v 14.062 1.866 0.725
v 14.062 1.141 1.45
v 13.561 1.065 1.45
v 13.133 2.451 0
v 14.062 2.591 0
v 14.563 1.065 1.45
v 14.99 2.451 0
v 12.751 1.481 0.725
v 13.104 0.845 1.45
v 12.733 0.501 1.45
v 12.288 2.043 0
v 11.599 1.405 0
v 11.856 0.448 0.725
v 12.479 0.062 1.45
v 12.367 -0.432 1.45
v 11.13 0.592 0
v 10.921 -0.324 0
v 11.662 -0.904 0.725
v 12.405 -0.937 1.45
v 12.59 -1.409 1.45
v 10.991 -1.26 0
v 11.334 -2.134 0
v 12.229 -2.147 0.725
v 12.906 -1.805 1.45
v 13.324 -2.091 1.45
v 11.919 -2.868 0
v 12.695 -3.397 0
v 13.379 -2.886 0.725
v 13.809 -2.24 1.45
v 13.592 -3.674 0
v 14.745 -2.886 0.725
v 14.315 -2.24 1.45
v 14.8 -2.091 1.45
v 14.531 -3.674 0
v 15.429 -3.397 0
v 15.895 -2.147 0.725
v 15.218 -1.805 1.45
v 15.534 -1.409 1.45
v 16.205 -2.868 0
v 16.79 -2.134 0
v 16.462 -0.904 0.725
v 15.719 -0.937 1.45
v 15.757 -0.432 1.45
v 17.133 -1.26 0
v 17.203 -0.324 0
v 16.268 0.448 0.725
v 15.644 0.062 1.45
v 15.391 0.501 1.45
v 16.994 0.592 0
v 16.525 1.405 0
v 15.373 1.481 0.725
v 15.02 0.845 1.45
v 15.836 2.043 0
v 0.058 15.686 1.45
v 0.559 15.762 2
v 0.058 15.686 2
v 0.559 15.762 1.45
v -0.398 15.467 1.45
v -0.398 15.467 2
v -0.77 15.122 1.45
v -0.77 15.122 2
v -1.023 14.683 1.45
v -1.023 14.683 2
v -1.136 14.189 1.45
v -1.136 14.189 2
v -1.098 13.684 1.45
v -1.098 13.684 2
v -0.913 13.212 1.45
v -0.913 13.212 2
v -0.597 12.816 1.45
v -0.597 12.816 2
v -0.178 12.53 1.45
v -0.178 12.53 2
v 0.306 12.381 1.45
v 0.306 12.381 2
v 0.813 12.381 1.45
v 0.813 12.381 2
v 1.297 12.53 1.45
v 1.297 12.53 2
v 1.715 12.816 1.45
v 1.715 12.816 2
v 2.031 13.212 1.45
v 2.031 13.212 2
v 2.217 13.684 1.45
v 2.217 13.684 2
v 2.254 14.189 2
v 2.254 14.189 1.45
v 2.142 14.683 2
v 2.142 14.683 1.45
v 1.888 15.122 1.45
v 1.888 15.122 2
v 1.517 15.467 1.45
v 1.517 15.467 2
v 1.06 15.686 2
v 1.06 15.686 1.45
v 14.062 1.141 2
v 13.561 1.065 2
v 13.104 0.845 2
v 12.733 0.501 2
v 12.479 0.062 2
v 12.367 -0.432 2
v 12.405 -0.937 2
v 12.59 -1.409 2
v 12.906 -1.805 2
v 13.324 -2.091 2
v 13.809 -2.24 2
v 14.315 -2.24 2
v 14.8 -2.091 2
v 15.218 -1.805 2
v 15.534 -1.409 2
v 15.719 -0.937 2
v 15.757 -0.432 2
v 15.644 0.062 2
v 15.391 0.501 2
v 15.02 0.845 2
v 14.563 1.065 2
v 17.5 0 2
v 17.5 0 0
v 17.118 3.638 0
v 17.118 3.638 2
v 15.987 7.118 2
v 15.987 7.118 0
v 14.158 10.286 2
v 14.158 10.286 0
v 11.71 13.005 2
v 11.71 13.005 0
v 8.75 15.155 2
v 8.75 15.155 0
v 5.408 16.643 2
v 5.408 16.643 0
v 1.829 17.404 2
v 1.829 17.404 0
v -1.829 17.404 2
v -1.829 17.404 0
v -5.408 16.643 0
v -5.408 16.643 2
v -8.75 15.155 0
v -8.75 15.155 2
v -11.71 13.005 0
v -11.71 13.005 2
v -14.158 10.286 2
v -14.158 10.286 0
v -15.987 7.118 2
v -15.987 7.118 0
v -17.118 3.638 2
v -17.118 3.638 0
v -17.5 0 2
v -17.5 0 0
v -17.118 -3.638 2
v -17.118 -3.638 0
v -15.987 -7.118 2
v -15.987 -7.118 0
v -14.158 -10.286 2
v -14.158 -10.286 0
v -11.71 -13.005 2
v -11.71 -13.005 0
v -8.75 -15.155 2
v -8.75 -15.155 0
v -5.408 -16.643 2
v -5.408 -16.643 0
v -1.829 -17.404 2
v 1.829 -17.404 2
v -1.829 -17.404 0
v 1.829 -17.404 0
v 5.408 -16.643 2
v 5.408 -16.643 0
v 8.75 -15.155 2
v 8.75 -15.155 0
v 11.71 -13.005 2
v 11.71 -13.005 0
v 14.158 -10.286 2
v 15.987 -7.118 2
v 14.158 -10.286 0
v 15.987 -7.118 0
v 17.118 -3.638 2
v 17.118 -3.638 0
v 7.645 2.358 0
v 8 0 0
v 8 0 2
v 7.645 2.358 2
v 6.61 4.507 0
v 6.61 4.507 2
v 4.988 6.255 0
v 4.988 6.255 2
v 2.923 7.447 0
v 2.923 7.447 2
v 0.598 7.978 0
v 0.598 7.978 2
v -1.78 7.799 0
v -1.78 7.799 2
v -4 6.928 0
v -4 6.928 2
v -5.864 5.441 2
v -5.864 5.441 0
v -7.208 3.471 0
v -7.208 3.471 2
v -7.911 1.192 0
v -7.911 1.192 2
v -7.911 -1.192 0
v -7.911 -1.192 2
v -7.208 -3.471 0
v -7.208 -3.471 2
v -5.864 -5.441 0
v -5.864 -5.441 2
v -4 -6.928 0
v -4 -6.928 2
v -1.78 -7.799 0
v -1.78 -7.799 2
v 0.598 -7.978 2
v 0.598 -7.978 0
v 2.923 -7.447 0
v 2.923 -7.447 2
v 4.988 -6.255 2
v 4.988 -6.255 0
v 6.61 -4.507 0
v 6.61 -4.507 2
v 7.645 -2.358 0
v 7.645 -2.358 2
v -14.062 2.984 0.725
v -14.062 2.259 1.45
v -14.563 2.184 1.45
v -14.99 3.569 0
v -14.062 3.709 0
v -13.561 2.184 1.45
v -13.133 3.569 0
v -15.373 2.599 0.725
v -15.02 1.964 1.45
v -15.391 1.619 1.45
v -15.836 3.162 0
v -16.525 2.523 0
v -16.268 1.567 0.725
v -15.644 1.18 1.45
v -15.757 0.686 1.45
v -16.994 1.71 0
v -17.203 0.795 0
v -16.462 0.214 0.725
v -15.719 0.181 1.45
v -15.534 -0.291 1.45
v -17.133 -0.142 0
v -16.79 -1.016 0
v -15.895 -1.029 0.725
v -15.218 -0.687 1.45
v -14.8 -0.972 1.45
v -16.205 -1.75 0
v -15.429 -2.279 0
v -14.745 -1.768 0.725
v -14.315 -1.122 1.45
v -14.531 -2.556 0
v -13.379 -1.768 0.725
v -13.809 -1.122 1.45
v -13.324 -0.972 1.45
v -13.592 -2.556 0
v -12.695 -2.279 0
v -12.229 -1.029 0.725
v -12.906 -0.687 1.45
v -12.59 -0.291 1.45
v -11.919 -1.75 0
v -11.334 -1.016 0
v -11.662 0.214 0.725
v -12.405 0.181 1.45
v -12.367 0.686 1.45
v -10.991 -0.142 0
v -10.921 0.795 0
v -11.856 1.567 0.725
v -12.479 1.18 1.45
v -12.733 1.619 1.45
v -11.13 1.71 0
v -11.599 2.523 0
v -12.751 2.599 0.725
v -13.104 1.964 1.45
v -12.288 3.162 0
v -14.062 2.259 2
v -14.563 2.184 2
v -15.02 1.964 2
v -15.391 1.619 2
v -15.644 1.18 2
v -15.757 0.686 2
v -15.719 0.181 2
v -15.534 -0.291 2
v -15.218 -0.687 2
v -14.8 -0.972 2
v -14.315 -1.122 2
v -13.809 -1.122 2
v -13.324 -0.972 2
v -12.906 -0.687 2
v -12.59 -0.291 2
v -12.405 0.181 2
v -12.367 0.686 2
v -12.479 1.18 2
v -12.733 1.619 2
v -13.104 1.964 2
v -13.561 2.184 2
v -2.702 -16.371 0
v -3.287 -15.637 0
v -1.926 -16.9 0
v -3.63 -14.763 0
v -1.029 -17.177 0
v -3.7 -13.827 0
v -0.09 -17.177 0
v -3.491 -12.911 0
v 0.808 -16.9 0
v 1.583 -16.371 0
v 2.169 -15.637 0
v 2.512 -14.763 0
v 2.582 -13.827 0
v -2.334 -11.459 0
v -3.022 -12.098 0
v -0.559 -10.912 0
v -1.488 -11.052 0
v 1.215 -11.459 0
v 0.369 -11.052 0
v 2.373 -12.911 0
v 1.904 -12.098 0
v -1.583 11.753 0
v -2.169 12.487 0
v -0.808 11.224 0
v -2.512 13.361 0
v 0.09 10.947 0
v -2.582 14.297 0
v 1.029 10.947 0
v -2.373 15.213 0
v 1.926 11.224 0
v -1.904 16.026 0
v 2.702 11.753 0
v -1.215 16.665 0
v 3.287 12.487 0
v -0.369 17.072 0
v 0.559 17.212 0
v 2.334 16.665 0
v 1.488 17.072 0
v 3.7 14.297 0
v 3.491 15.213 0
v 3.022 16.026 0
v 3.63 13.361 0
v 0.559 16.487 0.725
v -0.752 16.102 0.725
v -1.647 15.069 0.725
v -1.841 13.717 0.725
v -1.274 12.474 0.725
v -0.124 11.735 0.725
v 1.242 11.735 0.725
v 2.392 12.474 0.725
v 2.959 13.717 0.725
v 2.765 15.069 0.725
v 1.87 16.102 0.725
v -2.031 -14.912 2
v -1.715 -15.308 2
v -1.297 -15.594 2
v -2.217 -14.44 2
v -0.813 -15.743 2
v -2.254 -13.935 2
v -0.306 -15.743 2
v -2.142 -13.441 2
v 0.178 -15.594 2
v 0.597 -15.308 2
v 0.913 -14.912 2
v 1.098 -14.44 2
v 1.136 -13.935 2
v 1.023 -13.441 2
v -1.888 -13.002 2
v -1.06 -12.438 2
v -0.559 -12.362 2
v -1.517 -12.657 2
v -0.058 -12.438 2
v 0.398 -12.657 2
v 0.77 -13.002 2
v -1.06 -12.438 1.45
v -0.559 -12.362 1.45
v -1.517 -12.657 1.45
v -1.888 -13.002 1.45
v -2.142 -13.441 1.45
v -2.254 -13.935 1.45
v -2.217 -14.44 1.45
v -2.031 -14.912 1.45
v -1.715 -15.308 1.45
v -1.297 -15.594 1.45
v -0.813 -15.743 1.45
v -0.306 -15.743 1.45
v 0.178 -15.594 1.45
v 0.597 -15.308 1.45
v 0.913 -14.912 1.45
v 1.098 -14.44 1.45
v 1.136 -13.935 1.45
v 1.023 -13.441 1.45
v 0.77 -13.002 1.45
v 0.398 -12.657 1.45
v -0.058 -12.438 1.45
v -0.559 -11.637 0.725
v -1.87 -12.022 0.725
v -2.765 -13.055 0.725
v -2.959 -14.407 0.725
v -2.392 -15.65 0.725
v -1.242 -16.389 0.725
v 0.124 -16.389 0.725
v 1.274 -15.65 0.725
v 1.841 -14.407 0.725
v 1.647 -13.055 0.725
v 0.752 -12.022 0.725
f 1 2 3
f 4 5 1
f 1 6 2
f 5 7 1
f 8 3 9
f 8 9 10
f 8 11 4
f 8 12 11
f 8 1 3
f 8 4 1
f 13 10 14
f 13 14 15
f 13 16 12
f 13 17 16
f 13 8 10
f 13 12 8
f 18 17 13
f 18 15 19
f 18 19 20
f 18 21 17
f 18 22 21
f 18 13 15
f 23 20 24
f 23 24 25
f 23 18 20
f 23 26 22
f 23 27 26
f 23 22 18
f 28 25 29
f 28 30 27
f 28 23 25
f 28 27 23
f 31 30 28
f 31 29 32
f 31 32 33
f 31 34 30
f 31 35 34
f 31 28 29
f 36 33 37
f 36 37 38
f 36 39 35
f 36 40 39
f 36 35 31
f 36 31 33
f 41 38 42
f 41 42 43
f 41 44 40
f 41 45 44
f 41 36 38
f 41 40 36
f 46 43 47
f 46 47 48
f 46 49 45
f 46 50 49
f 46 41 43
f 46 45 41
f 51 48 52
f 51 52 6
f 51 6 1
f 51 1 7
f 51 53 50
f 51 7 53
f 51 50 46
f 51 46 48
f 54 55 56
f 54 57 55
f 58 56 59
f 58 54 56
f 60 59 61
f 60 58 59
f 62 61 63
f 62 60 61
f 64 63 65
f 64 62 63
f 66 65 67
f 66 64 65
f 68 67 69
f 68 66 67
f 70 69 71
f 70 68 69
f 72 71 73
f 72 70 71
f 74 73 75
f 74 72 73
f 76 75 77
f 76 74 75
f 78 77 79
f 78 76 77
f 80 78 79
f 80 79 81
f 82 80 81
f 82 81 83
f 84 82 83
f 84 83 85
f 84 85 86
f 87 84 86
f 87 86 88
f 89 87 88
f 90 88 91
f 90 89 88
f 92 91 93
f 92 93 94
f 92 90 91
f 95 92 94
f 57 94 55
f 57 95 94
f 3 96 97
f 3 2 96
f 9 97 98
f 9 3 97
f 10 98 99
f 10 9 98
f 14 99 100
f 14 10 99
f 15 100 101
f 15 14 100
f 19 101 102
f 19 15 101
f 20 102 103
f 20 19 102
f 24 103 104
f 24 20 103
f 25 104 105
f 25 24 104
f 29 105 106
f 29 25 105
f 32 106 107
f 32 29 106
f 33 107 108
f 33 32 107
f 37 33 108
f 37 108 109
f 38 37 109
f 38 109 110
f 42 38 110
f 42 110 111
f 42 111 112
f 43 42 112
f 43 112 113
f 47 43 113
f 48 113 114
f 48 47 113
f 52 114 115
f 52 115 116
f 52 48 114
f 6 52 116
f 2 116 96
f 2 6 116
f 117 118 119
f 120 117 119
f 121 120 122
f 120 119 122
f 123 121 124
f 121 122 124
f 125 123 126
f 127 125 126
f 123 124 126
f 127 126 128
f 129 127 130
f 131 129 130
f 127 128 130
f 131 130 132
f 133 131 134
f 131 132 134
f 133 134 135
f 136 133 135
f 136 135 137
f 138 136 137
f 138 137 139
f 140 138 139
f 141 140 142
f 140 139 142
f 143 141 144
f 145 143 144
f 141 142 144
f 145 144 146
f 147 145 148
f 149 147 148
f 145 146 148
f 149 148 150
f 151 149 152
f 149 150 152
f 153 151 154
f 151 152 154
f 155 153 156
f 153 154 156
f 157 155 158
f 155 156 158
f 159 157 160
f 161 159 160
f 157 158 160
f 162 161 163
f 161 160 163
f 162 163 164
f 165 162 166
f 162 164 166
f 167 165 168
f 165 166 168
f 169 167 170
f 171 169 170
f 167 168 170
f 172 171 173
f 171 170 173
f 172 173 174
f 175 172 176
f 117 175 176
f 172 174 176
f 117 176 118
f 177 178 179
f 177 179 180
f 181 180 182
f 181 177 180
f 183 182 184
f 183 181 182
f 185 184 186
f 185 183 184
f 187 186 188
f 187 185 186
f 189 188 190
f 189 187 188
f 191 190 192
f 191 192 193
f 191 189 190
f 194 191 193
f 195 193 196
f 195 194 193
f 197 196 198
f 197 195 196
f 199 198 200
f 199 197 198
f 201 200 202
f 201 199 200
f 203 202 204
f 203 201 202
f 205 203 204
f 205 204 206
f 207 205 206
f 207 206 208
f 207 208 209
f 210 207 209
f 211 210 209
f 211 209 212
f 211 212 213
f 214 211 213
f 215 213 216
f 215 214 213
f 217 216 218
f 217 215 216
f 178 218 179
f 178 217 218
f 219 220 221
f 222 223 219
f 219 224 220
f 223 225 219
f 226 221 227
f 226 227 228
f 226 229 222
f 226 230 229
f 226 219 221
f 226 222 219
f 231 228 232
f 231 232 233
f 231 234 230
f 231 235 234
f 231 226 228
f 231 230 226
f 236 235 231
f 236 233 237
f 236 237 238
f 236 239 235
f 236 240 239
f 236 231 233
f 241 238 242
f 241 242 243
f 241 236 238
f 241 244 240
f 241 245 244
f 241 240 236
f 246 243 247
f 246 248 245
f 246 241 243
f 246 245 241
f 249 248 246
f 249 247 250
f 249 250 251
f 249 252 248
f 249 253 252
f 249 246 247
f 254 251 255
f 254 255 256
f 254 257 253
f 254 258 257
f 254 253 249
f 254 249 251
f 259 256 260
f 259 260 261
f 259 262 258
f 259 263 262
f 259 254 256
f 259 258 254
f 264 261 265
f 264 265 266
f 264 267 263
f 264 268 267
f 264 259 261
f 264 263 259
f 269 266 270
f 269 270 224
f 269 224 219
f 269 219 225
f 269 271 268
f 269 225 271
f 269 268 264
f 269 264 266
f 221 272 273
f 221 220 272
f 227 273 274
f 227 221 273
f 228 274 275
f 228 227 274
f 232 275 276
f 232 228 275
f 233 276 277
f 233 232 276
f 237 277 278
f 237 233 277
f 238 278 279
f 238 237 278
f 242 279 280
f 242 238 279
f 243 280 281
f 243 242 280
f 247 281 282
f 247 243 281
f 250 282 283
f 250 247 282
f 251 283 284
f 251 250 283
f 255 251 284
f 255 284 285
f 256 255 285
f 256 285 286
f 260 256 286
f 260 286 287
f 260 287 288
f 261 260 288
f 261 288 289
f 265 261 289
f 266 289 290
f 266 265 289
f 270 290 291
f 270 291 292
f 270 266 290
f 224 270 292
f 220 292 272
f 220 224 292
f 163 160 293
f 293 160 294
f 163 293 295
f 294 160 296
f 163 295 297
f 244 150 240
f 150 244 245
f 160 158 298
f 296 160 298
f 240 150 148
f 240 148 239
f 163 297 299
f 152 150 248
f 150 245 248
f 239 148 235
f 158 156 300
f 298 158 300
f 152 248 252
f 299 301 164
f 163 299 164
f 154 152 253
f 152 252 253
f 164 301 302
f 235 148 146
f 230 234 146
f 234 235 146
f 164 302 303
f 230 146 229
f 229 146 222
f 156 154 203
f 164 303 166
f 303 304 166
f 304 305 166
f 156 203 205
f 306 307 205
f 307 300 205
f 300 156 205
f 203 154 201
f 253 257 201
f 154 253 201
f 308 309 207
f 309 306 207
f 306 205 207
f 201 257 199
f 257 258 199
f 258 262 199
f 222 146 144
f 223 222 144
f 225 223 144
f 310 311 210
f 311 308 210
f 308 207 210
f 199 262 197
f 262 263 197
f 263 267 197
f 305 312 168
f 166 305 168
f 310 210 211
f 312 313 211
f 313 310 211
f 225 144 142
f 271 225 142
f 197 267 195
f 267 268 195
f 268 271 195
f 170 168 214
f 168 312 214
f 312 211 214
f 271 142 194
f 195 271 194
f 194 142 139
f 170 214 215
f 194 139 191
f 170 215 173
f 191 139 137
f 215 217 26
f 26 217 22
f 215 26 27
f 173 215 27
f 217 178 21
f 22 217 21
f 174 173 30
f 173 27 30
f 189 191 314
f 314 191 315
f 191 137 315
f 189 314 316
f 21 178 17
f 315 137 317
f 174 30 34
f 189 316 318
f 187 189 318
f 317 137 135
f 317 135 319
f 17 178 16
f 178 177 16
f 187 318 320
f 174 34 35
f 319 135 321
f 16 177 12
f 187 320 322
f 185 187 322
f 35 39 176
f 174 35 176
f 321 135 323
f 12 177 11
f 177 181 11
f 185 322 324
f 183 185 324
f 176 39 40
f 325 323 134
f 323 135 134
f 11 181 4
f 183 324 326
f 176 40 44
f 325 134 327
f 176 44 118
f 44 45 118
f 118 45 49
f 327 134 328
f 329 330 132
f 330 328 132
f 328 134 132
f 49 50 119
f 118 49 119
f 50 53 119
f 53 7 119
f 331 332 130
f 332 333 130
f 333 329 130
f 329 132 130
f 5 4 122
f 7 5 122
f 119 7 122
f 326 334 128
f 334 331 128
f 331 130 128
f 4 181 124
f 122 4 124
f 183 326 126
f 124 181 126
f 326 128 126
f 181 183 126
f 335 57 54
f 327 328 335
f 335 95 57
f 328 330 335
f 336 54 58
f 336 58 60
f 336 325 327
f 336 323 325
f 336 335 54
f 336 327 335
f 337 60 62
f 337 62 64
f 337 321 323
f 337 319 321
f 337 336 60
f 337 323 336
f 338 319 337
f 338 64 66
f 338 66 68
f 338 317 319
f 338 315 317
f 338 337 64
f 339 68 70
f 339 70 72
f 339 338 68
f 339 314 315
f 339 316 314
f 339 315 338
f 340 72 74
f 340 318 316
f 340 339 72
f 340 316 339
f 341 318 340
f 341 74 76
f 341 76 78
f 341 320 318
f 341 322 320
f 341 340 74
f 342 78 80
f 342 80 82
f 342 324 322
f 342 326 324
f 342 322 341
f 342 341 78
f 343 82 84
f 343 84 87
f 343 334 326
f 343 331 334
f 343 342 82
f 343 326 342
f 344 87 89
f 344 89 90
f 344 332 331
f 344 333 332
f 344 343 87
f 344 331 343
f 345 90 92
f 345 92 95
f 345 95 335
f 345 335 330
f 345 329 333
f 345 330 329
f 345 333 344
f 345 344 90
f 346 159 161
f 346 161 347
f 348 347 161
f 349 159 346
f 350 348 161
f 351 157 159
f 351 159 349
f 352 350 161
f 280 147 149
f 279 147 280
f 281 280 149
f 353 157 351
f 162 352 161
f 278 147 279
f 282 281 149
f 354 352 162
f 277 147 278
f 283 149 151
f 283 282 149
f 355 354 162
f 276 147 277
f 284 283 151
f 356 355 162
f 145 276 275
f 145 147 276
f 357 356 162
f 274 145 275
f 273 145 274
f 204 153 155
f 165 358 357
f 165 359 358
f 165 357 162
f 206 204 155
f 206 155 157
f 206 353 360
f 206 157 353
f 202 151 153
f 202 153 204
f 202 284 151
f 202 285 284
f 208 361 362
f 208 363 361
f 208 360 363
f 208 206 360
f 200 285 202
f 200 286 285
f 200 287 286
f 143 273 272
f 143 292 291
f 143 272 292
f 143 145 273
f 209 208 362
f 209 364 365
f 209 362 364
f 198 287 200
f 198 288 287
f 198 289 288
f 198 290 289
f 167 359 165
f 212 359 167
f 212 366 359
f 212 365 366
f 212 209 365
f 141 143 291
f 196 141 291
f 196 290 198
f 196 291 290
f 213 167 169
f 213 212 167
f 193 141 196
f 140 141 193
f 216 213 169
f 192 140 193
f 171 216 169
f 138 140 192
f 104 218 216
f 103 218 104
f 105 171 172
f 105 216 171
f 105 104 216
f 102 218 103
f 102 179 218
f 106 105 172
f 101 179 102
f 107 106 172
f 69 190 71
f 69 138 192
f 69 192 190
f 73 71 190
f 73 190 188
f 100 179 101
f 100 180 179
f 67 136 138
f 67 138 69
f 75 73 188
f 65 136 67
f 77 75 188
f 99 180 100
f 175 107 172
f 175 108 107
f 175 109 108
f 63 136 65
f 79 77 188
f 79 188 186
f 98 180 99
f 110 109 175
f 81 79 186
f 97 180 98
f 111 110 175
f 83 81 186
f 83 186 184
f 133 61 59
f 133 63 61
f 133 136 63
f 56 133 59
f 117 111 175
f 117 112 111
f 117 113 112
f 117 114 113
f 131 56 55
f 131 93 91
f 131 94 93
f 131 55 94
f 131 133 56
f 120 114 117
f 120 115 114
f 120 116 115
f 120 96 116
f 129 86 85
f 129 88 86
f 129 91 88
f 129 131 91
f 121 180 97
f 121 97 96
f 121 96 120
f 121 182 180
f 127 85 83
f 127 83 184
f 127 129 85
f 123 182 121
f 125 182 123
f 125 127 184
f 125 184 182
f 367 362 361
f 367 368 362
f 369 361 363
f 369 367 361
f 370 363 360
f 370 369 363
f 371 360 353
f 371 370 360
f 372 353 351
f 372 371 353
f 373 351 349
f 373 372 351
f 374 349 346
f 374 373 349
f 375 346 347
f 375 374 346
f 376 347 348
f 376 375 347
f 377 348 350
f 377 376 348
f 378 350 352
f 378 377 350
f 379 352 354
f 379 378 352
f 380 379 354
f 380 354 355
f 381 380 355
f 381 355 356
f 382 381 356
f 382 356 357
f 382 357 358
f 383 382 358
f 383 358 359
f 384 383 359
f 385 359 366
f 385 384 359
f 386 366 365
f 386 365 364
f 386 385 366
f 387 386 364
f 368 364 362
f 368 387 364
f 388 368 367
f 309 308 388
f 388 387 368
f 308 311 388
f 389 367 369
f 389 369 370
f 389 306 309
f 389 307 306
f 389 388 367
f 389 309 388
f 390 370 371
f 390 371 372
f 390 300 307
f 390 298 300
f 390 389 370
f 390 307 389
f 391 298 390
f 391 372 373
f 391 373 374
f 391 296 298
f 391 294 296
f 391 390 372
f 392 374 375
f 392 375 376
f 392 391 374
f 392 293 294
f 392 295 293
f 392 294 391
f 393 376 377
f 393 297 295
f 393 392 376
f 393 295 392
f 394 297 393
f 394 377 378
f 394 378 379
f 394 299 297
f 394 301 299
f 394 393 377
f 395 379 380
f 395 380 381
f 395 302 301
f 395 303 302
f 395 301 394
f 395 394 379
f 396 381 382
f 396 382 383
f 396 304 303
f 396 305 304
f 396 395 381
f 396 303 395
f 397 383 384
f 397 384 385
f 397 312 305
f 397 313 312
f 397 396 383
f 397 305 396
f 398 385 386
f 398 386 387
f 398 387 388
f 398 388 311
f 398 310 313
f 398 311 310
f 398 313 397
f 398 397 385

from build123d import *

# Parameters (mm, degrees)
SKETCH1_R                                    = 17.5
SKETCH1_R_2                                  = 8
BOSS_EXTRUDE1_DEPTH                          = 2
CSK_FOR_M3_COUNTERSUNK_FLAT_HEAD_SCR_2_COUNT = 2
CSK_FOR_M3_COUNTERSUNK_FLAT_HEAD_SCR_2_PITCH = 19.902355243
CSK_FOR_M3_COUNTERSUNK_FLAT_HEAD_SCR_3_COUNT = 2
CSK_FOR_M3_COUNTERSUNK_FLAT_HEAD_SCR_3_PITCH = 28.146180708
CSK_FOR_M3_COUNTERSUNK_FLAT_HEAD_SCR_4_COUNT = 2
CSK_FOR_M3_COUNTERSUNK_FLAT_HEAD_SCR_4_PITCH = 19.902355243


with BuildPart() as part:
    # Sketch1 → Boss-Extrude1 (new body)
    with BuildSketch(Plane.XY):
        Circle(SKETCH1_R)
        Circle(SKETCH1_R_2, mode=Mode.SUBTRACT)
    extrude(amount=BOSS_EXTRUDE1_DEPTH)

    # Sketch3 → CSK for M3 Countersunk Flat Head Screw1 (revolve, cut)
    with BuildSketch(Plane(origin=(0.559155654, 14.061977708, 0), x_dir=(0, 1, 0), z_dir=(1, 0, 0))):
        Polygon((0, 0), (0, 2), (1.7, 2), (1.7, 1.45), (3.15, 0), align=None)
    csk_for_m3_countersunk_flat_head_screw1 = revolve(axis=Axis((0.559155654, 14.061977708, -6.35), (0, 0, 1)), mode=Mode.SUBTRACT)

    # CSK for M3 Countersunk Flat Head Scr 2: CSK for M3 Countersunk Flat Head Screw1 ×2
    with Locations(*[Vector(-0.7346433717813886, -0.6784534739373604, 0) * (i * CSK_FOR_M3_COUNTERSUNK_FLAT_HEAD_SCR_2_PITCH) for i in range(1, CSK_FOR_M3_COUNTERSUNK_FLAT_HEAD_SCR_2_COUNT)]):
        add(csk_for_m3_countersunk_flat_head_screw1, mode=Mode.SUBTRACT)

    # CSK for M3 Countersunk Flat Head Scr 3: CSK for M3 Countersunk Flat Head Screw1 ×2
    with Locations(*[Vector(-0.03973225779969332, -0.9992103620810479, 0) * (i * CSK_FOR_M3_COUNTERSUNK_FLAT_HEAD_SCR_3_PITCH) for i in range(1, CSK_FOR_M3_COUNTERSUNK_FLAT_HEAD_SCR_3_COUNT)]):
        add(csk_for_m3_countersunk_flat_head_screw1, mode=Mode.SUBTRACT)

    # CSK for M3 Countersunk Flat Head Scr 4: CSK for M3 Countersunk Flat Head Screw1 ×2
    with Locations(*[Vector(0.6784534739373631, -0.7346433717813861, 0) * (i * CSK_FOR_M3_COUNTERSUNK_FLAT_HEAD_SCR_4_PITCH) for i in range(1, CSK_FOR_M3_COUNTERSUNK_FLAT_HEAD_SCR_4_COUNT)]):
        add(csk_for_m3_countersunk_flat_head_screw1, mode=Mode.SUBTRACT)


solid = part.part
